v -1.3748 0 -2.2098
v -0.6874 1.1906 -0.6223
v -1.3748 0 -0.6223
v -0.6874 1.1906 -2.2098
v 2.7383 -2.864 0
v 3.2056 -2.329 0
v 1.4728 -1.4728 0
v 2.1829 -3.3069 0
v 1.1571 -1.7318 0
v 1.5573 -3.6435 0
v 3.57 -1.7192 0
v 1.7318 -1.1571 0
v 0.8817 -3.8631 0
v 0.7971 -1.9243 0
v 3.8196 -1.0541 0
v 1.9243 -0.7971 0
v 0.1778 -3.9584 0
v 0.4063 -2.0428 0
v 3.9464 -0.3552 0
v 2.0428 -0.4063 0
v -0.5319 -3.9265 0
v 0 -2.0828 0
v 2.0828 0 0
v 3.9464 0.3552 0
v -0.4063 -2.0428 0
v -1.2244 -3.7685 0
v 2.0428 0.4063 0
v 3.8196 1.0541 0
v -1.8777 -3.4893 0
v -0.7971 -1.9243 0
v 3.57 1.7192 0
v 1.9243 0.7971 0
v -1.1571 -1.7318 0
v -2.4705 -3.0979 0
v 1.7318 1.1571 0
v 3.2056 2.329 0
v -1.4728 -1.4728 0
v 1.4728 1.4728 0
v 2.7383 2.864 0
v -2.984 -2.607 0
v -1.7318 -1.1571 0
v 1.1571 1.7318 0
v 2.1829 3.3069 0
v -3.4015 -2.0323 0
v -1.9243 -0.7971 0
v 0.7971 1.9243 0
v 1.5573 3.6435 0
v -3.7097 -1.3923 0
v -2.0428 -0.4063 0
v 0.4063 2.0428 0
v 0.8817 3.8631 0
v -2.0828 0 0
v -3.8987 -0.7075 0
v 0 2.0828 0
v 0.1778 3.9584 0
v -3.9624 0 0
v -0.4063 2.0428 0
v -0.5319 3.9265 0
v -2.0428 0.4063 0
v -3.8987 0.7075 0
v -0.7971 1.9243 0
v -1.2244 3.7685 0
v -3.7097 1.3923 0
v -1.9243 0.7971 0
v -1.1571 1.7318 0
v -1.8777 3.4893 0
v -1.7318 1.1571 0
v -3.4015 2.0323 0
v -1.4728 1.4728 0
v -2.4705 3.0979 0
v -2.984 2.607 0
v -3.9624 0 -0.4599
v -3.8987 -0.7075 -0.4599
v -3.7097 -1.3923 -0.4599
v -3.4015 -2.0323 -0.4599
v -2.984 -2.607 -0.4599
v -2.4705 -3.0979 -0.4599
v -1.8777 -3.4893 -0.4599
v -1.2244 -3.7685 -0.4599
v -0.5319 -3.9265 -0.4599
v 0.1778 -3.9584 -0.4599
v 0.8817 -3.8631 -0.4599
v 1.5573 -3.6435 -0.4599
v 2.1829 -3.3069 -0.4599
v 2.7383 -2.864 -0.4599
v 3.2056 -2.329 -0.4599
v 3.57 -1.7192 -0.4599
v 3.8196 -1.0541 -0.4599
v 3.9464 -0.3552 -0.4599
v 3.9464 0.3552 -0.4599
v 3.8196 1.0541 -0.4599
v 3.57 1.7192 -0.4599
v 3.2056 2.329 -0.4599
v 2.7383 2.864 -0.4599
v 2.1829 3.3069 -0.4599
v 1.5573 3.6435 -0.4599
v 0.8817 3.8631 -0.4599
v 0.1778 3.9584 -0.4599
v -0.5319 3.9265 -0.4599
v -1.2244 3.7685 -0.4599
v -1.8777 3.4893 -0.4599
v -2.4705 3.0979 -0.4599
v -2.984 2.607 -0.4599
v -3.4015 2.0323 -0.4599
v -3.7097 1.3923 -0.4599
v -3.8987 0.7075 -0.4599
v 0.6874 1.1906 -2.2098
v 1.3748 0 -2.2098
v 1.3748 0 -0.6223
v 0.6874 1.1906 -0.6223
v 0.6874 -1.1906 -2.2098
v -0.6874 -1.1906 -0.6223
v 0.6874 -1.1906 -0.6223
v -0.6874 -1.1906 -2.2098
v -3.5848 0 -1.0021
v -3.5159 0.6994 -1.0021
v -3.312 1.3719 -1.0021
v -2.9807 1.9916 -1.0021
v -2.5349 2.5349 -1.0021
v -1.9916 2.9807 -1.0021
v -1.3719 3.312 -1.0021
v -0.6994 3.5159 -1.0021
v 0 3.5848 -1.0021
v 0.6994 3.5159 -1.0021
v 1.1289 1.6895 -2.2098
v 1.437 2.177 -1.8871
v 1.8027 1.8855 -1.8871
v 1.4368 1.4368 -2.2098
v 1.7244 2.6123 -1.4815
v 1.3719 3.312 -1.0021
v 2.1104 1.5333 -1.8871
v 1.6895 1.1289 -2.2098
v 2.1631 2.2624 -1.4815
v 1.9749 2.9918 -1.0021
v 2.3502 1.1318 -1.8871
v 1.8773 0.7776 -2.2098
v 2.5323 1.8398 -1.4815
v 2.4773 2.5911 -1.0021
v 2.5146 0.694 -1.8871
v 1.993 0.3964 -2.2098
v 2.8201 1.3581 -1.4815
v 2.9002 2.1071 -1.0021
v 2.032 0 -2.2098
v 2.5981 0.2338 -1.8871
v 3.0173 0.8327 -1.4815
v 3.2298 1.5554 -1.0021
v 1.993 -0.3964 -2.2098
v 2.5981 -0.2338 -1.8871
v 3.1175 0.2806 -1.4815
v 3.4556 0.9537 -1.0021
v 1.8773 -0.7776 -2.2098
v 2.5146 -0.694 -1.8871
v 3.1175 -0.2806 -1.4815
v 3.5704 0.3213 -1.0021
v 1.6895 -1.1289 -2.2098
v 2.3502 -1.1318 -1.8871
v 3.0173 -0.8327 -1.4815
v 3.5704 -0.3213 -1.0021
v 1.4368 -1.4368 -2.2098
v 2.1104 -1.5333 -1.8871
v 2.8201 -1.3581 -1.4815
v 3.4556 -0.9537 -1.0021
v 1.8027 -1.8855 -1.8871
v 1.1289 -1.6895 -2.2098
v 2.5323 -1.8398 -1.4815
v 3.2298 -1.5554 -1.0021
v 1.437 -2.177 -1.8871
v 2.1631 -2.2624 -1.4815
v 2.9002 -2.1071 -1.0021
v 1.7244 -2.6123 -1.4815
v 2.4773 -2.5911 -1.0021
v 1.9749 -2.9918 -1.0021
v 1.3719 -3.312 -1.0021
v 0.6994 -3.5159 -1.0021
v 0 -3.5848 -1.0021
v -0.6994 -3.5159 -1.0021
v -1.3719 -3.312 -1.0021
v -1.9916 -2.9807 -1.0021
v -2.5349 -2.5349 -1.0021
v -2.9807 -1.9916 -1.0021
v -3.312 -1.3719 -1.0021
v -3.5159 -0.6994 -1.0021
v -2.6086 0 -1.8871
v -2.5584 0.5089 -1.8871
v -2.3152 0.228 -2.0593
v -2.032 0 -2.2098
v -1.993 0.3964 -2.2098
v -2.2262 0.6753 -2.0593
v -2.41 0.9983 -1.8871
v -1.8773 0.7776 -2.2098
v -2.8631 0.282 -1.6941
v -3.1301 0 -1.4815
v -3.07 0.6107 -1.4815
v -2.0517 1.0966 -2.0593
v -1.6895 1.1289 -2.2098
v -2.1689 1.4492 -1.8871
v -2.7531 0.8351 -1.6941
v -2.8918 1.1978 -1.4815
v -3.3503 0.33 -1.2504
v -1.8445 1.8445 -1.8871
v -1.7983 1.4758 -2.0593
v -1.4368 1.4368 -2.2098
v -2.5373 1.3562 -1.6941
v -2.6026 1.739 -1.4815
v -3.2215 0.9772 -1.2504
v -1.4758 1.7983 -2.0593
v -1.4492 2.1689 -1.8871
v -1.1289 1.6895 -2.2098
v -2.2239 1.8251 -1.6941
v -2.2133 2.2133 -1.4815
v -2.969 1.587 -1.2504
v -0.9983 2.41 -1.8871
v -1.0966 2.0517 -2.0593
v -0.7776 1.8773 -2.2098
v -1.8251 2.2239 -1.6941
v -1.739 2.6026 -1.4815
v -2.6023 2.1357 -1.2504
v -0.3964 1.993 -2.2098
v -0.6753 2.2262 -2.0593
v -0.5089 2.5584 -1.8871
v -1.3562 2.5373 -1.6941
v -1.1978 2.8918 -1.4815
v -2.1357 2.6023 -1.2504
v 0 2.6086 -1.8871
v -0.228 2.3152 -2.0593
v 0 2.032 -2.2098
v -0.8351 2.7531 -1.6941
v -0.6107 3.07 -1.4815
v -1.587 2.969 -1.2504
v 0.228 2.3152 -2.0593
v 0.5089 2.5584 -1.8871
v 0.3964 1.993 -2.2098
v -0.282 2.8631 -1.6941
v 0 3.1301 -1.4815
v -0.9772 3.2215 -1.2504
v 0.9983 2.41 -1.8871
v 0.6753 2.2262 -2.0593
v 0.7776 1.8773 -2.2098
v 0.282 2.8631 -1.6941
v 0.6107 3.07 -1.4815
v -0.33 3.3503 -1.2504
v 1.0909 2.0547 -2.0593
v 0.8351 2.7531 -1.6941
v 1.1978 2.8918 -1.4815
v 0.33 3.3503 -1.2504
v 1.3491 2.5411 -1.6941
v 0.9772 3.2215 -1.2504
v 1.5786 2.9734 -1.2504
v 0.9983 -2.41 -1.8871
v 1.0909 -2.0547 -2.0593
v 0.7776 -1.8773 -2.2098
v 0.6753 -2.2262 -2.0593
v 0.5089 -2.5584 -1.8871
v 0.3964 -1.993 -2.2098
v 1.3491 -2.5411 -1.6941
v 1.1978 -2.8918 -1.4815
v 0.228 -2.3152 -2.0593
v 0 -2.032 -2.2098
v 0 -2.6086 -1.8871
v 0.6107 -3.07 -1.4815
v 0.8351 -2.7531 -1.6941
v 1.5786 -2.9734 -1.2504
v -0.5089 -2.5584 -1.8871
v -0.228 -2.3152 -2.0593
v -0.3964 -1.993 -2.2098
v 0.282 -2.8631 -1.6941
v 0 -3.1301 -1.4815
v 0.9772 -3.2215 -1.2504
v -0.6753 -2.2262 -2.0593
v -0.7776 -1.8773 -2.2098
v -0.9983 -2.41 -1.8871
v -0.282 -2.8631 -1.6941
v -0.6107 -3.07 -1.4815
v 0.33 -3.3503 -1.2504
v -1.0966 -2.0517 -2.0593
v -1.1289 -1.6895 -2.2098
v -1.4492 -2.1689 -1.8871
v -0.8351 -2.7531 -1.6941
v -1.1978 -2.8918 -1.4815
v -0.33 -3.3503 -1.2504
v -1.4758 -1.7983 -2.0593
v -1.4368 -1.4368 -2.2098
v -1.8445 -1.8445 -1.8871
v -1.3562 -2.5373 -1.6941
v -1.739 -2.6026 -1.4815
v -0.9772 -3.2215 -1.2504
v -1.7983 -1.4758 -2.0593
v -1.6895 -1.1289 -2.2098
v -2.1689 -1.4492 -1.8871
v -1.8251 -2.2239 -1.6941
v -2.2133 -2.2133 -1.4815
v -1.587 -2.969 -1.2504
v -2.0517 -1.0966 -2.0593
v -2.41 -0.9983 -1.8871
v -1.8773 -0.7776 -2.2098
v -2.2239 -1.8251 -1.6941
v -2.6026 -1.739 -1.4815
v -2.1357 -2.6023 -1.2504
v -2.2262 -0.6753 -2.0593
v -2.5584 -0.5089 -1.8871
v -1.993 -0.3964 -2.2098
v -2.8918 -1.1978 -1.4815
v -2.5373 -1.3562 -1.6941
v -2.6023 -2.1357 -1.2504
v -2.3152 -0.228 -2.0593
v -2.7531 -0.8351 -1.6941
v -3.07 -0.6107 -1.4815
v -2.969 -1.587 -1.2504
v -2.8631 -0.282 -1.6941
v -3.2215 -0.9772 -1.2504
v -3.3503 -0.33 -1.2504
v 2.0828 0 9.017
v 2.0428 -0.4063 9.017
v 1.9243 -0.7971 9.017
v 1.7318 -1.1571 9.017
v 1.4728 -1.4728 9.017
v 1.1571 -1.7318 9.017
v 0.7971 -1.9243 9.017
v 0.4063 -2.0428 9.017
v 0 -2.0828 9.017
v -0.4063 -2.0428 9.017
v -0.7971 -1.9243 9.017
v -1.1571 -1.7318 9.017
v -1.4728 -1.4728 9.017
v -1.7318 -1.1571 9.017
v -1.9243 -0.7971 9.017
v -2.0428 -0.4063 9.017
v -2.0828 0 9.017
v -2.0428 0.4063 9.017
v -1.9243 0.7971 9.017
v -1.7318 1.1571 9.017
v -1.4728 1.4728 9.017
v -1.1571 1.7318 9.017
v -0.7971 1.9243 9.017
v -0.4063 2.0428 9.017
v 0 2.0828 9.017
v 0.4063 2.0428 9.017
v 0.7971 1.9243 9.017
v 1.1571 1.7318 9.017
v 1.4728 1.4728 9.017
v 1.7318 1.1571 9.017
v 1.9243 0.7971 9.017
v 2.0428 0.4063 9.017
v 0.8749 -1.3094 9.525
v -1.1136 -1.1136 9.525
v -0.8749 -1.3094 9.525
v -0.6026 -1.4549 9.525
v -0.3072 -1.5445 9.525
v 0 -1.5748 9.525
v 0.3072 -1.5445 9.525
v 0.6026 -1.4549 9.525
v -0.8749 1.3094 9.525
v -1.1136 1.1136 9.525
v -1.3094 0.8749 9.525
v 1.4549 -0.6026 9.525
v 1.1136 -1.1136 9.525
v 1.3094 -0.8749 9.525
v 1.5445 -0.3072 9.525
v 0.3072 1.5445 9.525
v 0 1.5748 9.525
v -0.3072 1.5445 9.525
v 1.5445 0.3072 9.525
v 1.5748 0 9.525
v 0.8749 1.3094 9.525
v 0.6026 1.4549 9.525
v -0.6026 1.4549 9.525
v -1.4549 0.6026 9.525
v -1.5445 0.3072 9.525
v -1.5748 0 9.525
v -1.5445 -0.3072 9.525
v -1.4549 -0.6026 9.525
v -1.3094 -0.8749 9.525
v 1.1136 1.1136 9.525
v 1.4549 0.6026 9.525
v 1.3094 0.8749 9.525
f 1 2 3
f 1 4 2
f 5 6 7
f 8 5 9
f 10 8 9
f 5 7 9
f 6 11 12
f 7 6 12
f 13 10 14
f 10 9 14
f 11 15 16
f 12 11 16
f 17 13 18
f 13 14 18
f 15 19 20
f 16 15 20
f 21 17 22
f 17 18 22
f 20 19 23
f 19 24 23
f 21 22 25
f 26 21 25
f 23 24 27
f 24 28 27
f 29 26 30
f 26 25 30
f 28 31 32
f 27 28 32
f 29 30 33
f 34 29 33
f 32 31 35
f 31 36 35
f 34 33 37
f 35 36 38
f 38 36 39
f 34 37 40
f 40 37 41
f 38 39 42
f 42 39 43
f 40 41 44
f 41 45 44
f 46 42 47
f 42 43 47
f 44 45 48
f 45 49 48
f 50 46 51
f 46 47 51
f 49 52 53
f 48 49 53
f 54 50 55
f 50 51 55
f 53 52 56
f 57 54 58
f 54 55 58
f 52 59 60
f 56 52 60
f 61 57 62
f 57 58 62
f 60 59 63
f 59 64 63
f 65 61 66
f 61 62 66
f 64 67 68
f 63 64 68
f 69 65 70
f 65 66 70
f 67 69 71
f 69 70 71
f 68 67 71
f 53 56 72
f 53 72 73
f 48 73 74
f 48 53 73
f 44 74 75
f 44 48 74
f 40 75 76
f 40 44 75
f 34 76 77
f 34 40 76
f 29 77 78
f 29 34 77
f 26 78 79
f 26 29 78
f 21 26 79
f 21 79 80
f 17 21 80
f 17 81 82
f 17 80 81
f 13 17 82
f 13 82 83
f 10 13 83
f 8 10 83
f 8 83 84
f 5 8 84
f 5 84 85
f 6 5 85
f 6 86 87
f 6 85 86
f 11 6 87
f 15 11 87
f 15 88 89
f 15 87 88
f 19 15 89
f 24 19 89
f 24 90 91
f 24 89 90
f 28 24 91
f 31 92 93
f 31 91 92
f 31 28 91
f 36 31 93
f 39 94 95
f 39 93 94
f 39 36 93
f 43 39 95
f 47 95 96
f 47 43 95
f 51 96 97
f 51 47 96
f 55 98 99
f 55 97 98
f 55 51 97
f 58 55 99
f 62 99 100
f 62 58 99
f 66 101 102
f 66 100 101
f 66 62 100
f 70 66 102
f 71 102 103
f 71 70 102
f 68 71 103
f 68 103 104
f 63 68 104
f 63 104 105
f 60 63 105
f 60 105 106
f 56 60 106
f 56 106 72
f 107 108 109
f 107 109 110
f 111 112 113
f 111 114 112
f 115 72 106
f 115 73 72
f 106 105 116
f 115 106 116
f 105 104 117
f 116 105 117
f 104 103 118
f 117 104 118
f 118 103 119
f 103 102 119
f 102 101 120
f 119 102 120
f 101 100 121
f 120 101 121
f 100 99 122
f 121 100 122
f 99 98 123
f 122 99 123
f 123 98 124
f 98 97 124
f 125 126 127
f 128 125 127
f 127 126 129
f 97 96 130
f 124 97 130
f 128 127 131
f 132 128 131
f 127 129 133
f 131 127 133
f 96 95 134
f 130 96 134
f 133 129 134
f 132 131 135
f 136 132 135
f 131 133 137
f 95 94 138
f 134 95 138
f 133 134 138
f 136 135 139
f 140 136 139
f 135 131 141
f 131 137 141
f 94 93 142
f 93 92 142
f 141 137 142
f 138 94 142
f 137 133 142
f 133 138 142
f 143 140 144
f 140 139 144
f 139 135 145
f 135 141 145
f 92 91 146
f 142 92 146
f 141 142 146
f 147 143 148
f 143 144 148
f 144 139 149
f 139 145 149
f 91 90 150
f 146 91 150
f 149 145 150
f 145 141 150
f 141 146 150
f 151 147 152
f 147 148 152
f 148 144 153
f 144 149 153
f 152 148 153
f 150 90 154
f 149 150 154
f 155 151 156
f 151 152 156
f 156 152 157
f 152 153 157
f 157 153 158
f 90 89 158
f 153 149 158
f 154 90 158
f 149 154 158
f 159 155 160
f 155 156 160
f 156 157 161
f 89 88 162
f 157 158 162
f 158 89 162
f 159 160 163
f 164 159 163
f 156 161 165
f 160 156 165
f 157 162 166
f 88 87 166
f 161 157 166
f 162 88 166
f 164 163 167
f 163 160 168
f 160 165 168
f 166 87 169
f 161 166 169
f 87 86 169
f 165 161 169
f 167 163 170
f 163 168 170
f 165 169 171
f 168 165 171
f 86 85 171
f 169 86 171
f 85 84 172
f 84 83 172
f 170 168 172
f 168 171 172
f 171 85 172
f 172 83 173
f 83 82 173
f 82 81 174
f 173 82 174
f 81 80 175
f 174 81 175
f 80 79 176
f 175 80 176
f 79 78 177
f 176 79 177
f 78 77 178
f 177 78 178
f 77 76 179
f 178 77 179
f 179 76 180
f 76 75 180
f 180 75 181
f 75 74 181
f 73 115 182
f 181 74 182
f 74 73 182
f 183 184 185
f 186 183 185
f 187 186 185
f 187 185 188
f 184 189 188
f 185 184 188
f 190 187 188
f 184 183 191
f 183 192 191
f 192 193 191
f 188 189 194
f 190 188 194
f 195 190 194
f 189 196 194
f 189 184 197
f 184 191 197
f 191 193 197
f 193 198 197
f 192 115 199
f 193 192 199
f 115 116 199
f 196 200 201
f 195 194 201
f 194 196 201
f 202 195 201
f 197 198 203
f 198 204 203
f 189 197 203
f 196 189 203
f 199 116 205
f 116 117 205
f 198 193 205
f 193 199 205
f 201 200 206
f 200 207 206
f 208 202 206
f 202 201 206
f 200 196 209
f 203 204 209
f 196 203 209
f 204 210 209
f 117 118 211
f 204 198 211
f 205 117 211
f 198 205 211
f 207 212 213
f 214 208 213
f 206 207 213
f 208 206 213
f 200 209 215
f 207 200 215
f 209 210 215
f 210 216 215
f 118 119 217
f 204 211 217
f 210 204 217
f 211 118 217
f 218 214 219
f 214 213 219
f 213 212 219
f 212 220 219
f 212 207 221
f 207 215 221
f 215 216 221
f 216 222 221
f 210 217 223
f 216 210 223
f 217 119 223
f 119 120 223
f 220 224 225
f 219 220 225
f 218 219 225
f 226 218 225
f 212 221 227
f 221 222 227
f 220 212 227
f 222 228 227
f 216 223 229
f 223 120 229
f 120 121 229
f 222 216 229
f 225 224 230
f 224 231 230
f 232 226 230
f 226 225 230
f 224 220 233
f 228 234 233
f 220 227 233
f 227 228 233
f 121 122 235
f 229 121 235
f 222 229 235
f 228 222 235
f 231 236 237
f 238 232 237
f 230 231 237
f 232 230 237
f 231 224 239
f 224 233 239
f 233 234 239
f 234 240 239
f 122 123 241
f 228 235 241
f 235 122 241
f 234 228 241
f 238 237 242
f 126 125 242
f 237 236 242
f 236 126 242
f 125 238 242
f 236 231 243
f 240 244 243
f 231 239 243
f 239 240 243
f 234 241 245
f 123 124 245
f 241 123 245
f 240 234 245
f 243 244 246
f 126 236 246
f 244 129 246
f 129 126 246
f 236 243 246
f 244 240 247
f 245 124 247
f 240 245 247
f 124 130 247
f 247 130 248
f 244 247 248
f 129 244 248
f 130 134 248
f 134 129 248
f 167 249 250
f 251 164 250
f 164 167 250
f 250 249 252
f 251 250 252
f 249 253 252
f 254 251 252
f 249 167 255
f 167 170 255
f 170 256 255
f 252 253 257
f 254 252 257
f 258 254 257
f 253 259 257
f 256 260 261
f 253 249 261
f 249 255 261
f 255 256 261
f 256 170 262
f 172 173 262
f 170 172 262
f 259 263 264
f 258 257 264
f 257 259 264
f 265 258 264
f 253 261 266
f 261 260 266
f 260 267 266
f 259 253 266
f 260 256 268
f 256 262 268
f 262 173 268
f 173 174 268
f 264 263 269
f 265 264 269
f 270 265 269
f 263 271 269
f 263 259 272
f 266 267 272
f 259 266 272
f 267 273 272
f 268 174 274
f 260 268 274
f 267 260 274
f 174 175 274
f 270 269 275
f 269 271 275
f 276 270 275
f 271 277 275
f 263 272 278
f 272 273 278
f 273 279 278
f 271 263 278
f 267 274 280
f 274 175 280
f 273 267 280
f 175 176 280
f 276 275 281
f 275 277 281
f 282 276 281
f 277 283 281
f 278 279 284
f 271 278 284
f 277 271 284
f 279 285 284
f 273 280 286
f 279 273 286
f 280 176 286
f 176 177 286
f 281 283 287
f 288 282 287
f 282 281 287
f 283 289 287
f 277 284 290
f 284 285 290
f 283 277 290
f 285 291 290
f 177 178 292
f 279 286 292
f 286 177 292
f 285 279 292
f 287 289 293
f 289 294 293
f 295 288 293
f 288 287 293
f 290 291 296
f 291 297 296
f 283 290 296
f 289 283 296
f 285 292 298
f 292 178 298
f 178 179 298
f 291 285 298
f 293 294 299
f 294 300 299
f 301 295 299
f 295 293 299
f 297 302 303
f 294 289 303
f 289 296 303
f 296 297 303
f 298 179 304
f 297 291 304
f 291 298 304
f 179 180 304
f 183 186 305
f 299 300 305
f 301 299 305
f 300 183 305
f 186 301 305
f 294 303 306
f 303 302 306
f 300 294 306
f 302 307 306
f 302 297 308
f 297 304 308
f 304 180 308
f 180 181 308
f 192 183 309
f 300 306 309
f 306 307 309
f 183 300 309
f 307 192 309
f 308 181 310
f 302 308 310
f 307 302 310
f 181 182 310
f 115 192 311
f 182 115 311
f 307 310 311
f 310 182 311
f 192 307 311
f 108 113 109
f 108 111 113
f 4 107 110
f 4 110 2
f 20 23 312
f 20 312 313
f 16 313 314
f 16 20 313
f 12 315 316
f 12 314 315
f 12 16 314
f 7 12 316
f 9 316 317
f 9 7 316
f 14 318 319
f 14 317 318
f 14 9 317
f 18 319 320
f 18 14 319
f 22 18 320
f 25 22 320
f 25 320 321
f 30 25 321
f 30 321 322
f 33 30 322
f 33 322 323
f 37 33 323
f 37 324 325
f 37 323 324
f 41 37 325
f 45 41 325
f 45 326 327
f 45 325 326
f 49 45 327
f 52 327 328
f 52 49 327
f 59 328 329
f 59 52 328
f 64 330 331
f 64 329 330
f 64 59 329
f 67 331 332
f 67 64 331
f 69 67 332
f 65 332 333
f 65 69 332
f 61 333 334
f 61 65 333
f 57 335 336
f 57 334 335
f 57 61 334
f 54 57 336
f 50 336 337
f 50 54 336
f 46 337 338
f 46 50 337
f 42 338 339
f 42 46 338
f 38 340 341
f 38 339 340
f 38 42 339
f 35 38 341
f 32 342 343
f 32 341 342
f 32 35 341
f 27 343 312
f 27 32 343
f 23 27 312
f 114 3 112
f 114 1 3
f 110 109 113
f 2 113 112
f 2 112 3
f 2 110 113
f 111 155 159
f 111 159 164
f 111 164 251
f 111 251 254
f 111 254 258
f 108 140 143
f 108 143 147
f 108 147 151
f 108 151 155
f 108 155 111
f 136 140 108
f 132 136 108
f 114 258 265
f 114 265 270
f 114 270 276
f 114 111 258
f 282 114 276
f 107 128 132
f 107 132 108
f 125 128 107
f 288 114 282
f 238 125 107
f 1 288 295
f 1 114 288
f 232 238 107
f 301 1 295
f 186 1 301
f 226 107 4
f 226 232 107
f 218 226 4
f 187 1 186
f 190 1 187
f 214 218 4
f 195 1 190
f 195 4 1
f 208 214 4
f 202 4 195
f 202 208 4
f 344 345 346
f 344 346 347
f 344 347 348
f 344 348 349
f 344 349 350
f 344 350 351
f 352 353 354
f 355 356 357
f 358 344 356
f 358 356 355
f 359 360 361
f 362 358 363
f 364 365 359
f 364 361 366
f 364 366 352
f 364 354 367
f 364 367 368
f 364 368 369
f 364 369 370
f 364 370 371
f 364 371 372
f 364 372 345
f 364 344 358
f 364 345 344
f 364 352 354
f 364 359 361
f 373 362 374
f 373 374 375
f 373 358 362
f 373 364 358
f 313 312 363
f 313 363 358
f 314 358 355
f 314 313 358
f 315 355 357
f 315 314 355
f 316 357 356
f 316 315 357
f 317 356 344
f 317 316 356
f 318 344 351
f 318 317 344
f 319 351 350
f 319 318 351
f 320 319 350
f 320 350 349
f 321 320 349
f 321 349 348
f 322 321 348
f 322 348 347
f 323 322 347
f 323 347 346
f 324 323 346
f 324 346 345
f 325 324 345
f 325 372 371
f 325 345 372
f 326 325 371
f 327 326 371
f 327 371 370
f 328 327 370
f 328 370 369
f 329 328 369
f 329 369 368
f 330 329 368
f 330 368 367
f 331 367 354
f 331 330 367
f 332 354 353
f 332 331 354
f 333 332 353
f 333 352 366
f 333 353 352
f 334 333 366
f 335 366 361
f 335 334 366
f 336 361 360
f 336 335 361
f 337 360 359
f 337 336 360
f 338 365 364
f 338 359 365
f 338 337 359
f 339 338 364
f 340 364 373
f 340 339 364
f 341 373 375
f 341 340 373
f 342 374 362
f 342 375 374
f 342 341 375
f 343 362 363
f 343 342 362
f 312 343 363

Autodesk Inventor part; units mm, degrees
ref_plane "YZ Plane" through (0, 0, 0) normal (1, 0, 0) x (0, 1, 0)
ref_plane "XZ Plane" through (0, 0, 0) normal (0, 1, 0) x (-1, 0, 0)
ref_plane "XY Plane" through (0, 0, 0) normal (0, 0, 1) x (1, 0, 0)
sketch "Sketch1" plane through (0, 0, 0) normal (0, 0, 1) x (1, 0, 0)
  circle A0 centre (0, 0) radius 2.0828
  dimension "d0" = 4.1656
extrude "Extrusion1" add sketch "Sketch1" along normal blind 9.525
sketch "Sketch2" plane through (0, 0, 0) normal (0, 1, 0) x (-1, 0, 0)
  line L0 (0, 0) -> (0, -2.2098)
  line L1 (0, 0) -> (3.9624, 0)
  line L2 (0, -2.2098) -> (2.032, -2.2098)
  line L3 (3.9624, 0) -> (3.9624, 3.6562) construction
  arc A0 (2.032, -2.2098) -> (3.9624, -0.4599) centre (0.1837, 1.7689) ccw
  line L4 (4.5847, 0.6553) -> (4.5847, -0.2608) construction
  line L5 (3.9624, -0.4599) -> (3.9624, 0)
  dimension "d3" = 2.2098
  dimension "d6" = 2.032
  dimension "d19" = 3.9624
revolve "Revolution1" add sketch "Sketch2" angle 360 about axis through (0, 0, 0) along (0, 0, -1)
sketch "Sketch3" plane through (0, 0, -2.2098) normal (0, 0, -1) x (-1, 0, 0)
  circle A0 centre (0, 0) radius 2.032 projected
  line L0 (-0.6874, 1.1906) -> (0.6874, 1.1906)
  line L1 (0.6874, 1.1906) -> (1.3748, 0)
  line L2 (1.3748, 0) -> (0.6874, -1.1906)
  line L3 (0.6874, -1.1906) -> (-0.6874, -1.1906)
  line L4 (-0.6874, -1.1906) -> (-1.3748, 0)
  line L5 (-1.3748, 0) -> (-0.6874, 1.1906)
  dimension "d8" = 2.3813
extrude "Extrusion2" cut sketch "Sketch3" against normal blind 1.5875 contours L0 L1 L2 L3 L4 L5
chamfer "Chamfer1" distance 0.508 angle 45 1 edges at (-2.0828, 0, 9.525)
thread "Thread1" size "8-32 UNC" class "2A" standard "ANSI Unified Screw Threads" full length
properties part number "10-32 x500 button head" material "Steel"
